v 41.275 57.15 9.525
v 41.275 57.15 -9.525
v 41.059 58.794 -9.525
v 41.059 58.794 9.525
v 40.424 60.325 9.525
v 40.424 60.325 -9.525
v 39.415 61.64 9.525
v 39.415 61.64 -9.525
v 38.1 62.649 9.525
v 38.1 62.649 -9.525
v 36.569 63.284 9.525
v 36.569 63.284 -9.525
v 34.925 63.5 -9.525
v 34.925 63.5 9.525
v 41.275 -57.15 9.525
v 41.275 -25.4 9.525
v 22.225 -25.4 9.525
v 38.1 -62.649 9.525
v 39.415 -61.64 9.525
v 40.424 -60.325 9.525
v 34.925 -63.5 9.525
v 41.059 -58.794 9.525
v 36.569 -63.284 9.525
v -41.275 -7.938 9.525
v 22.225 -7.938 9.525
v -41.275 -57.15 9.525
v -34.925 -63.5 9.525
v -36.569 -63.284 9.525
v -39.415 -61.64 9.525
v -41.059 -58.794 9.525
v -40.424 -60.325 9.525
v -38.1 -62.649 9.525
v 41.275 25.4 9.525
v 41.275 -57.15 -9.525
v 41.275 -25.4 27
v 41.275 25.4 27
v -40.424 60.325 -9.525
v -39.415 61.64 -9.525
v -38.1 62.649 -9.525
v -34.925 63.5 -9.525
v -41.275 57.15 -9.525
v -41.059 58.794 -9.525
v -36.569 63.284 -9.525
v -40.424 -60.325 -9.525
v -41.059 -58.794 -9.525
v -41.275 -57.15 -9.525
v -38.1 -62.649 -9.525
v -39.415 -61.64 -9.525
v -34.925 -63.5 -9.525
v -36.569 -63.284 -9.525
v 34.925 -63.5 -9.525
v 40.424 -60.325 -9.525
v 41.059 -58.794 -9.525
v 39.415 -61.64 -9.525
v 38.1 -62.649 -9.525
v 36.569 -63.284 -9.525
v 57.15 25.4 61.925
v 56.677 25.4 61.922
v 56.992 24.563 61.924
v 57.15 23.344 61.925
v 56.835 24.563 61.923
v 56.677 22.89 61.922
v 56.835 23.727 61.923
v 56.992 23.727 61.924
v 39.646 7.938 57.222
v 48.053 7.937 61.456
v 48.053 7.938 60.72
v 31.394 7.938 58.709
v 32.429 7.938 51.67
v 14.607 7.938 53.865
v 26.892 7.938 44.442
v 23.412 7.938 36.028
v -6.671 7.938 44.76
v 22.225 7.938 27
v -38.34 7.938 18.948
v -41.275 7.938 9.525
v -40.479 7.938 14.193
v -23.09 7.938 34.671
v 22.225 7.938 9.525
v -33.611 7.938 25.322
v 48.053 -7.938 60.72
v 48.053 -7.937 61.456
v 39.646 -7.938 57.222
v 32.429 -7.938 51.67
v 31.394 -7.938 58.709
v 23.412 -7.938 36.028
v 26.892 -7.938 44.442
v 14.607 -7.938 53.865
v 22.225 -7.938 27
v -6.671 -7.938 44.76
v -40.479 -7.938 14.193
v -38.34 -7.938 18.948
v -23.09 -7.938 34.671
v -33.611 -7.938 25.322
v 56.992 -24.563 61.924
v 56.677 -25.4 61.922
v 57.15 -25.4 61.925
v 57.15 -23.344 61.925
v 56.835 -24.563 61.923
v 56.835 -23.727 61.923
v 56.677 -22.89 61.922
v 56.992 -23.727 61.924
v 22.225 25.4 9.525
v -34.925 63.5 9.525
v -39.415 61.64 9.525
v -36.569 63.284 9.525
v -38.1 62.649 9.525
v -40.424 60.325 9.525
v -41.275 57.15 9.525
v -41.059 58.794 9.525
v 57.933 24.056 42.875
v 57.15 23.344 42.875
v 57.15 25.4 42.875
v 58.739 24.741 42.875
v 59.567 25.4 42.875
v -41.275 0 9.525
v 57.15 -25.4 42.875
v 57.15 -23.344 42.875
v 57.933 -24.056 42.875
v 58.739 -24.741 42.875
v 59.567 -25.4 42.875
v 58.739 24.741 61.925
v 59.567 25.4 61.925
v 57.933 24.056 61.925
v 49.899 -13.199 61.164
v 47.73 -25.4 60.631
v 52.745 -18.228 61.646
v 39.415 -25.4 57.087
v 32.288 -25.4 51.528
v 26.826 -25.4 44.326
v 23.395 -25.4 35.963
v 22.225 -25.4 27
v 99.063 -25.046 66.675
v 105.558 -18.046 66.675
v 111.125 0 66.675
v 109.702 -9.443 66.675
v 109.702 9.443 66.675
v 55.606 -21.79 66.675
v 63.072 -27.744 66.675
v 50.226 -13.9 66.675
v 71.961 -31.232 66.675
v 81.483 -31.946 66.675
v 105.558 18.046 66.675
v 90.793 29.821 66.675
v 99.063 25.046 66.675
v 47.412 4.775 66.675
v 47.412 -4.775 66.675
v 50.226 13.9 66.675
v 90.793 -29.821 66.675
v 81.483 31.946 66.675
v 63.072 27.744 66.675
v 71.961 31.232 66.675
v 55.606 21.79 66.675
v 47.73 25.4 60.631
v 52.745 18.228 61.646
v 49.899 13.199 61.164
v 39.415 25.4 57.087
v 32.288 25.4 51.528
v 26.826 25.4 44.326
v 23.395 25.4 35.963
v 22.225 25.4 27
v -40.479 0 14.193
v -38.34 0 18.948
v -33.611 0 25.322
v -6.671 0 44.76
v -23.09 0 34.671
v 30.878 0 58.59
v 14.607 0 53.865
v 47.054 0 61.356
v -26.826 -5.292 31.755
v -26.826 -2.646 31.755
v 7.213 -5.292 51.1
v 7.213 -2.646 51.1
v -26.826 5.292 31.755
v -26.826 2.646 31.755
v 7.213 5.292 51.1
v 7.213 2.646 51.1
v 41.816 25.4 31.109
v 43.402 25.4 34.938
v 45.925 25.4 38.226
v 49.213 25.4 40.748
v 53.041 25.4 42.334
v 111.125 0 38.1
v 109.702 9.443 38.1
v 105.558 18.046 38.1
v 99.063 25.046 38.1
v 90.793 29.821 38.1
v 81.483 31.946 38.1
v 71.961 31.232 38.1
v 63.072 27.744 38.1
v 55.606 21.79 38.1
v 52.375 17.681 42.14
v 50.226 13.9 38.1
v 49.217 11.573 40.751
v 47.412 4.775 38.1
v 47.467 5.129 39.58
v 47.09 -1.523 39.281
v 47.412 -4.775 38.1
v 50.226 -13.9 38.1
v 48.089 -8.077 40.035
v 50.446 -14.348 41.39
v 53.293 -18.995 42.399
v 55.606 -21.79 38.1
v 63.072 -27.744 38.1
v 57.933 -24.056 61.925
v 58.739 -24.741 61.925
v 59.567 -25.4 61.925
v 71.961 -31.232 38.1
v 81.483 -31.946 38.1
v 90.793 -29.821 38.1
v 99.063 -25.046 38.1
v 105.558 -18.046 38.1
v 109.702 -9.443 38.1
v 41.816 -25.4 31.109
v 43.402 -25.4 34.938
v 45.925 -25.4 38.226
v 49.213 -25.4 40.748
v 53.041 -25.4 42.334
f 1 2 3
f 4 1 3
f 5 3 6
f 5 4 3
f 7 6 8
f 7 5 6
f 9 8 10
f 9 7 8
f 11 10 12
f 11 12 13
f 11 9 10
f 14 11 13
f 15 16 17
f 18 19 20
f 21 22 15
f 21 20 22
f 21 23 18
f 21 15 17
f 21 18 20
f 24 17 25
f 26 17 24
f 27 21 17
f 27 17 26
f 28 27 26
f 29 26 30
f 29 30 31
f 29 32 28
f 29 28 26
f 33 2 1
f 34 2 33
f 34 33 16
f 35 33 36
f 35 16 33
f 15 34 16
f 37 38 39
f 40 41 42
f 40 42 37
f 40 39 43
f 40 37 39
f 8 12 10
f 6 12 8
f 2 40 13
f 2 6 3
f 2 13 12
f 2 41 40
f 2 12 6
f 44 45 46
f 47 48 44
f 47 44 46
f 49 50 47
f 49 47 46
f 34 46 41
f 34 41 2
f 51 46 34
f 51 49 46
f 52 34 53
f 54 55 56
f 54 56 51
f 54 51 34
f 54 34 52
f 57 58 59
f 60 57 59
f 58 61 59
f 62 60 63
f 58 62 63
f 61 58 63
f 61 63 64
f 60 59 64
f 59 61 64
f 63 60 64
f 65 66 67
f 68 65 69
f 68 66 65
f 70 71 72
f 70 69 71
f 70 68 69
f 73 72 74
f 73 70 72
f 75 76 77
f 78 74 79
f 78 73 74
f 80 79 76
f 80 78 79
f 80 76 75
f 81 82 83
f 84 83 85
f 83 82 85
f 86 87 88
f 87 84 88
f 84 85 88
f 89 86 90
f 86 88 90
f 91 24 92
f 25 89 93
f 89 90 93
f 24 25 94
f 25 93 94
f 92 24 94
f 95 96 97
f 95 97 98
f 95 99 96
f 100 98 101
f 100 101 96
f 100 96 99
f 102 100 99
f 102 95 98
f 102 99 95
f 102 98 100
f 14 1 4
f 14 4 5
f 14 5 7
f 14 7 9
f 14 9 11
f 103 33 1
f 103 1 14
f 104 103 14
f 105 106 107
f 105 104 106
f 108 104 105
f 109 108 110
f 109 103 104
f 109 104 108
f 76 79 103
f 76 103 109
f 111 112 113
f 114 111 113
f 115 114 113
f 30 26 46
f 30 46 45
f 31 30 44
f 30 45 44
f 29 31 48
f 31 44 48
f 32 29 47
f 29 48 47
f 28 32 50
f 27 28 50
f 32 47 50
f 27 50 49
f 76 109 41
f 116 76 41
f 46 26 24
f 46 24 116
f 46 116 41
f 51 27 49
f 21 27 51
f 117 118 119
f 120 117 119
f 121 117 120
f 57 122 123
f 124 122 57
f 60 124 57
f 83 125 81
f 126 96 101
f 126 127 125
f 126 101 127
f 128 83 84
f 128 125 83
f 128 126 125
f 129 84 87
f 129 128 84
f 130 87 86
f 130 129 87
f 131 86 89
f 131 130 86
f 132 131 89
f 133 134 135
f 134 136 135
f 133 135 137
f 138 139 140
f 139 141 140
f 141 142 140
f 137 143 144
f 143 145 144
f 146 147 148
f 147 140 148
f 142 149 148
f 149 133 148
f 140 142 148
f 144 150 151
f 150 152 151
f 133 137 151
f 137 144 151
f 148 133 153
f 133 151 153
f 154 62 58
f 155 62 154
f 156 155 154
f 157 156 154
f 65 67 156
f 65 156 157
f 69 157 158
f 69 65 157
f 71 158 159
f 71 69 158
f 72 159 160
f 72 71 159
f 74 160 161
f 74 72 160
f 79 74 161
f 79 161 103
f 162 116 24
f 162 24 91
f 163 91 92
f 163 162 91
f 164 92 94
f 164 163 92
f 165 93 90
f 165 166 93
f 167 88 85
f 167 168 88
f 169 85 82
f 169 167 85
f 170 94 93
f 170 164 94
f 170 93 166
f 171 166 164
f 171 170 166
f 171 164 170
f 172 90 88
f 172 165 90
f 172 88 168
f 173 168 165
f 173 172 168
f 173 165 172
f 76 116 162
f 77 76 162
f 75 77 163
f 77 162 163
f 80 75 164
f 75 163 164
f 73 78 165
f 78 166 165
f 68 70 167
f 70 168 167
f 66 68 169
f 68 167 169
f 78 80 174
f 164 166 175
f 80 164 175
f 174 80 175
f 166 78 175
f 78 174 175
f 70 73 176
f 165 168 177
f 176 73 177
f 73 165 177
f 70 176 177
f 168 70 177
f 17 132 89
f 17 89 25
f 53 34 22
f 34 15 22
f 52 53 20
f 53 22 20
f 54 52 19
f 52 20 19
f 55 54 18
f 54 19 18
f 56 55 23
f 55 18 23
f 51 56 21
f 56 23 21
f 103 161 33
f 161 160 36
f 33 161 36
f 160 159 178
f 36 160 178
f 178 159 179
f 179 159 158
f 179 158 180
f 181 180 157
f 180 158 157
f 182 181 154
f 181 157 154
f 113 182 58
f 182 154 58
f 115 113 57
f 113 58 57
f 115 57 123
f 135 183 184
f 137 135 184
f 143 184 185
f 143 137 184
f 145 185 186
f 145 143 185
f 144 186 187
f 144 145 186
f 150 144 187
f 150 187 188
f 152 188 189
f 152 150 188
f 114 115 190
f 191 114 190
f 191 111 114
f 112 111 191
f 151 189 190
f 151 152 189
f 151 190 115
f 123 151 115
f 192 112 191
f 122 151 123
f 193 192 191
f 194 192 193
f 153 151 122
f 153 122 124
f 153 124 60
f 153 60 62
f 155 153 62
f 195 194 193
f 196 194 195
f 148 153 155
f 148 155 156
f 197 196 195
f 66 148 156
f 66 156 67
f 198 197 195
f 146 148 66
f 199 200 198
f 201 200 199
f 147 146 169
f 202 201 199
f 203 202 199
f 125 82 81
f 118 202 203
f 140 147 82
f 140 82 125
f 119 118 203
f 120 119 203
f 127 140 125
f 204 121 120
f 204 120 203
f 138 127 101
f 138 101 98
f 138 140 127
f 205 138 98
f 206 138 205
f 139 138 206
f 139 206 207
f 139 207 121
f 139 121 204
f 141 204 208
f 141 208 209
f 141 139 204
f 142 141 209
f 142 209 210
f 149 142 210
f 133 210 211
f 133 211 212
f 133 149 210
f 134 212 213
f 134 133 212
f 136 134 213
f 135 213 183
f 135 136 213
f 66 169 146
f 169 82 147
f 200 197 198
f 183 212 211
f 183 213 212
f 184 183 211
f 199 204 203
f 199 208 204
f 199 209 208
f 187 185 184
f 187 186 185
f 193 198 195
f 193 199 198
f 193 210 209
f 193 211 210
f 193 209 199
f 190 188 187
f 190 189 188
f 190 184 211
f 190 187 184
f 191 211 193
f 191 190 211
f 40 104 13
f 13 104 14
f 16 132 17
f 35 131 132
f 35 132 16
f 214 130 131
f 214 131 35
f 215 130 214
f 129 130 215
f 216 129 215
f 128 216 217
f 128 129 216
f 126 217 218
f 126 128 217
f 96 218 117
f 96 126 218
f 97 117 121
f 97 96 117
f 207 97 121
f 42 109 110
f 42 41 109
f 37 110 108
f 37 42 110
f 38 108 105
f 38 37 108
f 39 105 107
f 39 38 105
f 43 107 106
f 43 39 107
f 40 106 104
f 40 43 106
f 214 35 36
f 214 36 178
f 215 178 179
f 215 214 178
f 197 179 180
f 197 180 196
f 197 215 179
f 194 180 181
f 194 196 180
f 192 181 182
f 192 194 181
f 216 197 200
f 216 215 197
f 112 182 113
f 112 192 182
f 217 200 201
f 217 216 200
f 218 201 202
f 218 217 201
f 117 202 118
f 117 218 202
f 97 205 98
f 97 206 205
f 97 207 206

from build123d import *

# Parameters (mm, degrees)
F1_DEPTH = 63.5
F2_DEPTH = 25.4
F3_DEPTH = 7.9375
F0_W     = 32.035574
F0_H     = 28.575
F5_R     = 6.35


with BuildPart() as f1:
    # F0 (on Front) → F1 (new body, symmetric)
    with BuildSketch(Plane.XZ):
        Polygon((-41.275, 9.525), (-41.275, -9.525), (41.275, -9.525), (41.275, 9.525), (22.225, 9.525), align=None)
    extrude(amount=F1_DEPTH, both=True)

    # F0 (on Front) → F2 (join, symmetric)
    with BuildSketch(Plane.XZ):
        with BuildLine():
            Line((22.225, 9.525), (41.275, 9.525))
            Line((41.275, 9.525), (41.275, 27.0002))
            ThreePointArc((41.275, 27.0002), (45.92468, 38.22552), (57.15, 42.8752))
            Line((57.15, 42.8752), (60.325, 42.8752))
            Line((60.325, 42.8752), (60.325, 61.9252))
            Line((60.325, 61.9252), (57.15, 61.9252))
            add(Edge.make_bspline(
                [(56.676857, 61.921995), (56.834796, 61.923482), (56.992512, 61.924551), (57.15, 61.9252)],
                knots=[111.078345, 111.078345, 111.078345, 111.078345, 111.504536, 111.504536, 111.504536, 111.504536], degree=3))
            ThreePointArc((56.676857, 61.921995), (32.287577, 51.528053), (22.225, 27.0002))
            Line((22.225, 27.0002), (22.225, 9.525))
        make_face()
    extrude(amount=F2_DEPTH, both=True)

    # F0 (on Front) → F3 (join, symmetric)
    with BuildSketch(Plane.XZ):
        with BuildLine():
            add(Edge.make_bspline(
                [(-41.275, 9.525), (-40.855104, 32.748828), (15.513022, 61.534422), (56.676857, 61.921995)],
                knots=[0, 0, 0, 0, 111.078345, 111.078345, 111.078345, 111.078345], degree=3))
            Line((-41.275, 9.525), (22.225, 9.525))
            Line((22.225, 9.525), (22.225, 27.0002))
            ThreePointArc((22.225, 27.0002), (32.287577, 51.528053), (56.676857, 61.921995))
        make_face()
    extrude(amount=F3_DEPTH, both=True)

    # F0 (on Front) → F4 (revolve)
    with BuildSketch(Plane.XZ):
        with Locations((95.107213, 52.3875)):
            Rectangle(F0_W, F0_H)
    revolve(axis=Axis((79.089426, 0, 52.3875), (0, 0, 1)))

    # F5
    f5_edges = [f1.edges().sort_by_distance(p)[0] for p in [
        (41.275, -63.5, 0),
        (-41.275, -63.5, 0),
        (41.275, 63.5, 0),
        (-41.275, 63.5, 0),
    ]]
    fillet(f5_edges, radius=F5_R)


solid = f1.part
